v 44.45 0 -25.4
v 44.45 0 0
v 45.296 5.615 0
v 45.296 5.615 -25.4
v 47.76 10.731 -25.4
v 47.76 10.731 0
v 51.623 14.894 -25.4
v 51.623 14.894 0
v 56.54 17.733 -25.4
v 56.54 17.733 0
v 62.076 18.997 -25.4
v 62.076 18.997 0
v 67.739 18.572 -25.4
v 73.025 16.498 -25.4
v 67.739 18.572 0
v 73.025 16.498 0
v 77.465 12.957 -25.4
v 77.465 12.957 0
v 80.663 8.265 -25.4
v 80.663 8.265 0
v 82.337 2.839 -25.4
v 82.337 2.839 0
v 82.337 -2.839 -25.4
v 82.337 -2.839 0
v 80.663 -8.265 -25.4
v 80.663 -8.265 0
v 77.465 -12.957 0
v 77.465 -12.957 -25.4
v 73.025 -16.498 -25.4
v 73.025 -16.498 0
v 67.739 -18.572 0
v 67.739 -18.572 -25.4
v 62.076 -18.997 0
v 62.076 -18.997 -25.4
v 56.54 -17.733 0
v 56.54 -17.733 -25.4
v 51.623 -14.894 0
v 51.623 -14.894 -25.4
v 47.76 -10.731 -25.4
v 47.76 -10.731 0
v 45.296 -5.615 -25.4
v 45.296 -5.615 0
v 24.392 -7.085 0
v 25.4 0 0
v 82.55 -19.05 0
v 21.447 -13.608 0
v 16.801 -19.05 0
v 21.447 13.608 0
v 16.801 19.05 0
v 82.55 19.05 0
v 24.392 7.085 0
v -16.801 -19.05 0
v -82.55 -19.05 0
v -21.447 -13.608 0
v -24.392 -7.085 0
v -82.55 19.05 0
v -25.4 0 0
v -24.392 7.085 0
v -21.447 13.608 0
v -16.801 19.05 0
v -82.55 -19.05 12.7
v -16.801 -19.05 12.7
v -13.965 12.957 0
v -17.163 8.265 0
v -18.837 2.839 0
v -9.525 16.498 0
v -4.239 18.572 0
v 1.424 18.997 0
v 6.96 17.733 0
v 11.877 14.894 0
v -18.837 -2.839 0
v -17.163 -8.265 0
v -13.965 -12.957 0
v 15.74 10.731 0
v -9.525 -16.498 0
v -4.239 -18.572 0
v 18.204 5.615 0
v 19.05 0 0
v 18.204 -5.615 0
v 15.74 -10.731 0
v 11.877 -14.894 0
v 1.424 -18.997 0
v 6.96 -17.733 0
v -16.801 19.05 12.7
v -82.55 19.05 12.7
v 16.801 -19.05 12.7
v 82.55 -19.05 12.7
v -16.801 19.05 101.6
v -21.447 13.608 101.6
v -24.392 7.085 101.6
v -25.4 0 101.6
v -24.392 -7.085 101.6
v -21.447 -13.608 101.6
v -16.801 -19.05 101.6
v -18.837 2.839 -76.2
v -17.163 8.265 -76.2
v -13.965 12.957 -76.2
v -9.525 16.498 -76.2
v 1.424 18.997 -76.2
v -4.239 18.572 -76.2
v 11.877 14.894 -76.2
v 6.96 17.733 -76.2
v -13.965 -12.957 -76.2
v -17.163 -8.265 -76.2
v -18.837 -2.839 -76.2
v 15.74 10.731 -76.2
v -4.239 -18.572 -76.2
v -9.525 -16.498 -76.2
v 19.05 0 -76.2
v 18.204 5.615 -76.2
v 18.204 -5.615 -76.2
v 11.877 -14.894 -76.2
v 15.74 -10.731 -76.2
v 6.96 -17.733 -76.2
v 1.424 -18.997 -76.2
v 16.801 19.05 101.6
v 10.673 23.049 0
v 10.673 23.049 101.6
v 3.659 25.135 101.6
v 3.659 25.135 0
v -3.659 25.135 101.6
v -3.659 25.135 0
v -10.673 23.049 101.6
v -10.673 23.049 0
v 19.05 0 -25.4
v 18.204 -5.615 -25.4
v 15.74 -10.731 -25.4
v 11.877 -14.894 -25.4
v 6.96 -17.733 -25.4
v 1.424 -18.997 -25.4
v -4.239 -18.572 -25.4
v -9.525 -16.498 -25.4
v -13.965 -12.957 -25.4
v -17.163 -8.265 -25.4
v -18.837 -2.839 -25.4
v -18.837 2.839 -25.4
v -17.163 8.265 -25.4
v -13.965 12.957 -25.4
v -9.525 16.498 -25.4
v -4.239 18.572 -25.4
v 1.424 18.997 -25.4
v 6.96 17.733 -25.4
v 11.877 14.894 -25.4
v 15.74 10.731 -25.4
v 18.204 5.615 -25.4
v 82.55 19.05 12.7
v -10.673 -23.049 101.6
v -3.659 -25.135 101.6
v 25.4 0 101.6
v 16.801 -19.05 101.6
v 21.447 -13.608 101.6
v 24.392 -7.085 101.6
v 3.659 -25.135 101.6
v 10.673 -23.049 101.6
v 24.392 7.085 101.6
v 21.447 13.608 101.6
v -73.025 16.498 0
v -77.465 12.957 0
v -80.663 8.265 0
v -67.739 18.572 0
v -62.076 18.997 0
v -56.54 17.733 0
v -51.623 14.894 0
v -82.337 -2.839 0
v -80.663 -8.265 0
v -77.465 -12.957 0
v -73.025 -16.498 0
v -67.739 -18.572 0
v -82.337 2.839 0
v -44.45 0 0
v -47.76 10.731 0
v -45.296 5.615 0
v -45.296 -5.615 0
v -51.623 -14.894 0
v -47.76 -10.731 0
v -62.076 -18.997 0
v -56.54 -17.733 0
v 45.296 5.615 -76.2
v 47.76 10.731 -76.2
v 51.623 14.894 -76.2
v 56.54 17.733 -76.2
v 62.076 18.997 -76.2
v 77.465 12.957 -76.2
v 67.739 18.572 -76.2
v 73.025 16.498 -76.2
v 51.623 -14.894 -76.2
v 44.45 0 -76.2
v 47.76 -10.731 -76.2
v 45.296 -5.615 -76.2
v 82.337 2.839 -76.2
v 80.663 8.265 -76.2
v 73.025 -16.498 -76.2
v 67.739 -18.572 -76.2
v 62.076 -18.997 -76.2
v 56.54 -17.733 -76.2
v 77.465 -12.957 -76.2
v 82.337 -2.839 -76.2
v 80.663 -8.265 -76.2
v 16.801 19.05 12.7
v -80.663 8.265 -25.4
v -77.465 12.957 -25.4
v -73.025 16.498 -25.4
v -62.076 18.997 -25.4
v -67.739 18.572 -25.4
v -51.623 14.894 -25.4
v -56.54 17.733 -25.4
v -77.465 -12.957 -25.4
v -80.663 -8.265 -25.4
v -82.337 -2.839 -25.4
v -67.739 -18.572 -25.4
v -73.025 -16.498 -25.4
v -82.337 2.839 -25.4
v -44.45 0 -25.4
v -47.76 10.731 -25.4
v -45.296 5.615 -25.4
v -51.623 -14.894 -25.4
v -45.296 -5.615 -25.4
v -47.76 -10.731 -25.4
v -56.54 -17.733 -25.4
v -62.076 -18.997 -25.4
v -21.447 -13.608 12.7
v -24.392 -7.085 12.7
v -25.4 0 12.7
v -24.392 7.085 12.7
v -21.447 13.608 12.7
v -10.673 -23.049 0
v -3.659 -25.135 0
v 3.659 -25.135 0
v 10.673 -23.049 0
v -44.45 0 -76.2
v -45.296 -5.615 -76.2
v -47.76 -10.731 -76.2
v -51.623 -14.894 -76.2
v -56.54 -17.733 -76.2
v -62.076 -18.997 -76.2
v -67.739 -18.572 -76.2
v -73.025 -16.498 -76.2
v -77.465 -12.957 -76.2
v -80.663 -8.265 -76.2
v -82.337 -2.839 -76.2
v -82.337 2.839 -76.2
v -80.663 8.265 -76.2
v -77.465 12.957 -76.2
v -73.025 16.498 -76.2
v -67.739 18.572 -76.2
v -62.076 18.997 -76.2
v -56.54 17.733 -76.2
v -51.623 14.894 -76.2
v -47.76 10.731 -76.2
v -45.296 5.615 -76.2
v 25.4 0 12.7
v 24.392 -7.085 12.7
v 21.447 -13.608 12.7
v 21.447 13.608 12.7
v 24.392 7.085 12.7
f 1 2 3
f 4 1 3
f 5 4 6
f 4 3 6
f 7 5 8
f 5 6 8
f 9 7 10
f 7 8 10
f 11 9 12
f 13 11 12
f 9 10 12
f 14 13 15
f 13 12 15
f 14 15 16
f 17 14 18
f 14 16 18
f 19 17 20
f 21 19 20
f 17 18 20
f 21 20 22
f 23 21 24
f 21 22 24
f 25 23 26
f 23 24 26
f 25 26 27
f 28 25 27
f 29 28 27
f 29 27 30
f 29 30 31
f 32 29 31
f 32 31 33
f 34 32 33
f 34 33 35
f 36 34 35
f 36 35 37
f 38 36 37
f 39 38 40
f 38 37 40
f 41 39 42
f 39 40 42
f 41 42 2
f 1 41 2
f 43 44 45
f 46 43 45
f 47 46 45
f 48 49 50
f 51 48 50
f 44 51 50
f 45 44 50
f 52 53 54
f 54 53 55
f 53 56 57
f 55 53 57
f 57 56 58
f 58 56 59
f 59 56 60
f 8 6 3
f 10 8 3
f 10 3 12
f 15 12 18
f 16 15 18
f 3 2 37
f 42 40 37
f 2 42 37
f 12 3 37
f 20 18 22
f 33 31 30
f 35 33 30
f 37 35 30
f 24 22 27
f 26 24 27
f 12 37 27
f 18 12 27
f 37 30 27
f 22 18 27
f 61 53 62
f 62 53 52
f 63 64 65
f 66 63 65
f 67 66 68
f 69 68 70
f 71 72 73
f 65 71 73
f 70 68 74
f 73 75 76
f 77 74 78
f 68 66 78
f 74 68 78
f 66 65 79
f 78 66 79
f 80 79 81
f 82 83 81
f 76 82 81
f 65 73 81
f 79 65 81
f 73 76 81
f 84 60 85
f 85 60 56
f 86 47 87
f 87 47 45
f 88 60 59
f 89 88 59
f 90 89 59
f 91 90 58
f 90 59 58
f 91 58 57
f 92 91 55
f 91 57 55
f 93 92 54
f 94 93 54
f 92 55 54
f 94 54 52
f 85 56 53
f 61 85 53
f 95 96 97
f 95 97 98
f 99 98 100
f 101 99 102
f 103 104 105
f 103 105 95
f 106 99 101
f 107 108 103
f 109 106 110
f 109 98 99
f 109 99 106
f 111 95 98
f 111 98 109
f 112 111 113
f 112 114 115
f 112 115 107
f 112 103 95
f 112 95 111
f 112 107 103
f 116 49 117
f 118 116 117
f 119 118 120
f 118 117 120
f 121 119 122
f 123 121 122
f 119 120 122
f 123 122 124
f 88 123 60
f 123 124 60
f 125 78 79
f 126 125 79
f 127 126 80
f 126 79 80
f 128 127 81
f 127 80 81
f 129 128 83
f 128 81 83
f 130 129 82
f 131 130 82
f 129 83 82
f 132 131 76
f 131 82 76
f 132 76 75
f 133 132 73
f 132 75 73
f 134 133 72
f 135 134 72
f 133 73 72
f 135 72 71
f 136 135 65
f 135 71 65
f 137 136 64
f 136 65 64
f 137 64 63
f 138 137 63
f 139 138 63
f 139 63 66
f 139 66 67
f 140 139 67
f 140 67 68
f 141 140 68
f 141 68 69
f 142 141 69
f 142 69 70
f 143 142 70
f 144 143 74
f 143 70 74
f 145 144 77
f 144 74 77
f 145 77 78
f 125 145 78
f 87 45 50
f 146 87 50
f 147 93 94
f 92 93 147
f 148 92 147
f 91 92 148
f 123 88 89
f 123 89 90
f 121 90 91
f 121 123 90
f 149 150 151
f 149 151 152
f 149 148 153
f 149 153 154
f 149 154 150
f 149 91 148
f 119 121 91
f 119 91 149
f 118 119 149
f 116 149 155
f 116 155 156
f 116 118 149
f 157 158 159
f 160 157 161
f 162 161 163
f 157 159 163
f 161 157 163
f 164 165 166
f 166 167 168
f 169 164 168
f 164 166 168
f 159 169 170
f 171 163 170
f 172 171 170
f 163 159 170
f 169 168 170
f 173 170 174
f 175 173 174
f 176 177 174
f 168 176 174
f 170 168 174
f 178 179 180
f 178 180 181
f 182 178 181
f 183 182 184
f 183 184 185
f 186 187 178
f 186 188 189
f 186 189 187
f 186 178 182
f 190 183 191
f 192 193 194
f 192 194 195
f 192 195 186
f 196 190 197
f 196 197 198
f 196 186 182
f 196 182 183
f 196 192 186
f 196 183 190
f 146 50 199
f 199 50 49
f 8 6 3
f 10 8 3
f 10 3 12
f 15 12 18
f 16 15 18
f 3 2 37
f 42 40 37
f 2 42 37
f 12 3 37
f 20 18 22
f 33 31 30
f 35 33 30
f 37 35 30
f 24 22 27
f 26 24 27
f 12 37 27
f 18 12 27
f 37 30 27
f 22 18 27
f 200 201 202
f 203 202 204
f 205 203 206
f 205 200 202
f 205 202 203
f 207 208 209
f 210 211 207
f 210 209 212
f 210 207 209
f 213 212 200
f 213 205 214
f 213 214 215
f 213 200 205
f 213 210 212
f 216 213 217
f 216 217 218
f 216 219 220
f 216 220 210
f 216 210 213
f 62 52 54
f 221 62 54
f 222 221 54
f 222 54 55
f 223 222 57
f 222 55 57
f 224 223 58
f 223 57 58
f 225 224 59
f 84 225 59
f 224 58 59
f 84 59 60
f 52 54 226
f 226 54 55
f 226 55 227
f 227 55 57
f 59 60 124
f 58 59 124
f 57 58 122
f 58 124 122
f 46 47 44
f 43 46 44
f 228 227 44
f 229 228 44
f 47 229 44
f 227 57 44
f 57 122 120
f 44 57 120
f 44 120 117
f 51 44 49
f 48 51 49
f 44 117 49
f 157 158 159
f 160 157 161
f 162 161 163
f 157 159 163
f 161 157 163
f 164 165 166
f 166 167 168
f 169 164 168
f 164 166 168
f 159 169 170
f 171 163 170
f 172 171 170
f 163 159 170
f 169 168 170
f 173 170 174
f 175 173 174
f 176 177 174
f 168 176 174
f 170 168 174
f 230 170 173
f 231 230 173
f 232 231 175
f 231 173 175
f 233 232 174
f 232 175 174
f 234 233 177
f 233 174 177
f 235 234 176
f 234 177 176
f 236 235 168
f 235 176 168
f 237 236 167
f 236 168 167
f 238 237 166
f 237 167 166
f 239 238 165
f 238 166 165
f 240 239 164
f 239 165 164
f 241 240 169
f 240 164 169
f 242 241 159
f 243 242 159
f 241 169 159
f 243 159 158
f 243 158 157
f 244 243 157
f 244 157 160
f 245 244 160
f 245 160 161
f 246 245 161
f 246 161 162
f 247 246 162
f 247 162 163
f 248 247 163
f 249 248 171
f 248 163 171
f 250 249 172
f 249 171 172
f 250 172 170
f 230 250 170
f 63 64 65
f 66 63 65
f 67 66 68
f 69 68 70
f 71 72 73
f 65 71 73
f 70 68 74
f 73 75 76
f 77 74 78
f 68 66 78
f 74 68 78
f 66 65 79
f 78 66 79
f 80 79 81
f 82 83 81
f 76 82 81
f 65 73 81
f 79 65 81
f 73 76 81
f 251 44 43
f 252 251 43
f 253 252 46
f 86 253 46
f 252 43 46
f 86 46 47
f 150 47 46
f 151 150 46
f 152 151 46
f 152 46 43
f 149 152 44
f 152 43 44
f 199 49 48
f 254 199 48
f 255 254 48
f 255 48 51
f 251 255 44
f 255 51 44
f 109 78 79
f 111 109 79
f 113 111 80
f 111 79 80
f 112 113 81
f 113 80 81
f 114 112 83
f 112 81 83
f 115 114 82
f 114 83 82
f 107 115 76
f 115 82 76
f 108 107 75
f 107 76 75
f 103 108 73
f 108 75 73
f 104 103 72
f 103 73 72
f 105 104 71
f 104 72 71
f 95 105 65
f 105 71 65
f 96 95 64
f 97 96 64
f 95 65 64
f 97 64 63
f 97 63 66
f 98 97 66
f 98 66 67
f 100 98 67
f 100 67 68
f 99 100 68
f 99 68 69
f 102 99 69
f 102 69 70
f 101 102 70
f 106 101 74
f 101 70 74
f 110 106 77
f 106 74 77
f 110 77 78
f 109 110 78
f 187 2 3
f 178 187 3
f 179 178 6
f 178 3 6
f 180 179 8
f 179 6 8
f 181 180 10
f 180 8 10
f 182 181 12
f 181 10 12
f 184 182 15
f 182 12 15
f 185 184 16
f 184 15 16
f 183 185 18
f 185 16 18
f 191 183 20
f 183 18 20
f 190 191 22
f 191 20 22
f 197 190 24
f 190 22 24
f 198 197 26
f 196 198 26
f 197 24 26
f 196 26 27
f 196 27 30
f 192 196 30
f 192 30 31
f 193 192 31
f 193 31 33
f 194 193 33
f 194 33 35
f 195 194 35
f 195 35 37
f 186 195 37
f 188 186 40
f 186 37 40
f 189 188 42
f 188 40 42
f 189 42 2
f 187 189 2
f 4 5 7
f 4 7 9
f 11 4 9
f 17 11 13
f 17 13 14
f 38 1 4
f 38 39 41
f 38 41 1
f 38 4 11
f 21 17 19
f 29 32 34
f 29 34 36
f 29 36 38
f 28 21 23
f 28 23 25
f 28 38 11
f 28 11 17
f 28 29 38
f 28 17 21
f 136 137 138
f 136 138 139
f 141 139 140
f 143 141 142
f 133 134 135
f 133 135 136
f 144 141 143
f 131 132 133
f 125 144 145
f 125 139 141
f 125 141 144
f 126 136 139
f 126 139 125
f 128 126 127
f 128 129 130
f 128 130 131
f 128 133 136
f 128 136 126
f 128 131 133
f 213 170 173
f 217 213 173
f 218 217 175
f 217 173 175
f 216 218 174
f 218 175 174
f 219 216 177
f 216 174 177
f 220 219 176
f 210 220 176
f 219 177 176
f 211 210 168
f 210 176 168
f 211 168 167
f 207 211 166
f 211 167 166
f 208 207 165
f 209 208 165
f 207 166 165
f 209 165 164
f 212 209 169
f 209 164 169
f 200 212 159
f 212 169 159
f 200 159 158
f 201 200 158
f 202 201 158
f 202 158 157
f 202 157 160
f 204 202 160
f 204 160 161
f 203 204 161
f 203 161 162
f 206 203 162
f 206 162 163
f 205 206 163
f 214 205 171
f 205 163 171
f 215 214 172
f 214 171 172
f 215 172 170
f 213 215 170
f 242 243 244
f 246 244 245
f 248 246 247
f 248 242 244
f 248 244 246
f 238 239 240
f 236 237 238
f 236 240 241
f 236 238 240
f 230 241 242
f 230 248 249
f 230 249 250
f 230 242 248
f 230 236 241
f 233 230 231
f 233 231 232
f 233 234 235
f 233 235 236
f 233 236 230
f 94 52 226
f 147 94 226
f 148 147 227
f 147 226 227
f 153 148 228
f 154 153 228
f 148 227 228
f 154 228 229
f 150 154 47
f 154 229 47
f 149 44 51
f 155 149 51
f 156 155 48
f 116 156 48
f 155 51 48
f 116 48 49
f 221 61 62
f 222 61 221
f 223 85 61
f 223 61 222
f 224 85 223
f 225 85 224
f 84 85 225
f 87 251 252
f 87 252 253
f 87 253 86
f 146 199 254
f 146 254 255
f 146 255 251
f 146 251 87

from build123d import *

# Parameters (mm, degrees)
F1_DEPTH = 12.7
F2_DEPTH = 101.6
F4_DEPTH = 25.4
F3_R     = 19.05
F5_DEPTH = 76.2


with BuildPart() as f1:
    # F0 (on Top) → F1 (new body)
    with BuildSketch(Plane.XY):
        with BuildLine():
            ThreePointArc((-16.8005208253, -19.05), (-25.4, 0), (-16.8005208253, 19.05))
            Line((-16.8005208253, 19.05), (-82.55, 19.05))
            Line((-82.55, 19.05), (-82.55, -19.05))
            Line((-82.55, -19.05), (-16.8005208253, -19.05))
        make_face()
    extrude(amount=F1_DEPTH)


with BuildPart() as f1b:
    # F0 (on Top) → F1, piece 2 (new body)
    with BuildSketch(Plane.XY):
        with BuildLine():
            ThreePointArc((16.8005208253, 19.05), (23.1505208253, 10.4505208253), (25.4, 0))
            ThreePointArc((25.4, 0), (23.1505208253, -10.4505208253), (16.8005208253, -19.05))
            Line((16.8005208253, -19.05), (82.55, -19.05))
            Line((82.55, -19.05), (82.55, 19.05))
            Line((82.55, 19.05), (16.8005208253, 19.05))
        make_face()
    extrude(amount=F1_DEPTH)


with BuildPart() as f2:
    # F0 (on Top) → F2 (new body)
    with BuildSketch(Plane.XY):
        with BuildLine():
            ThreePointArc((16.8005208253, -19.05), (23.1505208253, -10.4505208253), (25.4, 0))
            ThreePointArc((25.4, 0), (23.1505208253, 10.4505208253), (16.8005208253, 19.05))
            Line((16.8005208253, 19.05), (-16.8005208253, 19.05))
            ThreePointArc((-16.8005208253, 19.05), (-25.4, 0), (-16.8005208253, -19.05))
            Line((-16.8005208253, -19.05), (16.8005208253, -19.05))
        make_face()
        with BuildLine():
            ThreePointArc((-16.8005208253, -19.05), (0, -25.4), (16.8005208253, -19.05))
            Line((16.8005208253, -19.05), (-16.8005208253, -19.05))
        make_face()
        with BuildLine():
            Line((-16.8005208253, 19.05), (16.8005208253, 19.05))
            ThreePointArc((16.8005208253, 19.05), (0, 25.4), (-16.8005208253, 19.05))
        make_face()
    extrude(amount=F2_DEPTH)


with BuildPart() as f4:
    # F3 (on face) → F4 (new body)
    with BuildSketch(Plane(origin=(0, 0, 0), x_dir=(1, 0, 0), z_dir=(0, 0, -1))):
        with BuildLine():
            ThreePointArc((-19.05, 0), (0, -19.05), (19.05, 0))
            ThreePointArc((19.05, 0), (0, 19.05), (-19.05, 0))
        make_face()
    extrude(amount=F4_DEPTH)


with BuildPart() as f4b:
    # F3 (on face) → F4, piece 2 (new body)
    with BuildSketch(Plane(origin=(0, 0, 0), x_dir=(1, 0, 0), z_dir=(0, 0, -1))):
        with Locations((-63.5, 0)):
            Circle(F3_R)
    extrude(amount=F4_DEPTH)


with BuildPart() as f4c:
    # F3 (on face) → F4, piece 3 (new body)
    with BuildSketch(Plane(origin=(0, 0, 0), x_dir=(1, 0, 0), z_dir=(0, 0, -1))):
        with BuildLine():
            ThreePointArc((82.55, 0), (63.5, 19.05), (44.45, 0))
            ThreePointArc((44.45, 0), (63.5, -19.05), (82.55, 0))
        make_face()
    extrude(amount=F4_DEPTH)


with BuildPart() as f5:
    # F3 (on face) → F5 (new body)
    with BuildSketch(Plane(origin=(0, 0, 0), x_dir=(1, 0, 0), z_dir=(0, 0, -1))):
        with BuildLine():
            ThreePointArc((-19.05, 0), (0, -19.05), (19.05, 0))
            ThreePointArc((19.05, 0), (0, 19.05), (-19.05, 0))
        make_face()
    extrude(amount=F5_DEPTH)


with BuildPart() as f5b:
    # F3 (on face) → F5, piece 2 (new body)
    with BuildSketch(Plane(origin=(0, 0, 0), x_dir=(1, 0, 0), z_dir=(0, 0, -1))):
        with Locations((-63.5, 0)):
            Circle(F3_R)
    extrude(amount=F5_DEPTH)


with BuildPart() as f5c:
    # F3 (on face) → F5, piece 3 (new body)
    with BuildSketch(Plane(origin=(0, 0, 0), x_dir=(1, 0, 0), z_dir=(0, 0, -1))):
        with BuildLine():
            ThreePointArc((82.55, 0), (63.5, 19.05), (44.45, 0))
            ThreePointArc((44.45, 0), (63.5, -19.05), (82.55, 0))
        make_face()
    extrude(amount=F5_DEPTH)


solid = Compound([f1.part, f1b.part, f2.part, f4.part, f4b.part, f4c.part, f5.part, f5b.part, f5c.part])
